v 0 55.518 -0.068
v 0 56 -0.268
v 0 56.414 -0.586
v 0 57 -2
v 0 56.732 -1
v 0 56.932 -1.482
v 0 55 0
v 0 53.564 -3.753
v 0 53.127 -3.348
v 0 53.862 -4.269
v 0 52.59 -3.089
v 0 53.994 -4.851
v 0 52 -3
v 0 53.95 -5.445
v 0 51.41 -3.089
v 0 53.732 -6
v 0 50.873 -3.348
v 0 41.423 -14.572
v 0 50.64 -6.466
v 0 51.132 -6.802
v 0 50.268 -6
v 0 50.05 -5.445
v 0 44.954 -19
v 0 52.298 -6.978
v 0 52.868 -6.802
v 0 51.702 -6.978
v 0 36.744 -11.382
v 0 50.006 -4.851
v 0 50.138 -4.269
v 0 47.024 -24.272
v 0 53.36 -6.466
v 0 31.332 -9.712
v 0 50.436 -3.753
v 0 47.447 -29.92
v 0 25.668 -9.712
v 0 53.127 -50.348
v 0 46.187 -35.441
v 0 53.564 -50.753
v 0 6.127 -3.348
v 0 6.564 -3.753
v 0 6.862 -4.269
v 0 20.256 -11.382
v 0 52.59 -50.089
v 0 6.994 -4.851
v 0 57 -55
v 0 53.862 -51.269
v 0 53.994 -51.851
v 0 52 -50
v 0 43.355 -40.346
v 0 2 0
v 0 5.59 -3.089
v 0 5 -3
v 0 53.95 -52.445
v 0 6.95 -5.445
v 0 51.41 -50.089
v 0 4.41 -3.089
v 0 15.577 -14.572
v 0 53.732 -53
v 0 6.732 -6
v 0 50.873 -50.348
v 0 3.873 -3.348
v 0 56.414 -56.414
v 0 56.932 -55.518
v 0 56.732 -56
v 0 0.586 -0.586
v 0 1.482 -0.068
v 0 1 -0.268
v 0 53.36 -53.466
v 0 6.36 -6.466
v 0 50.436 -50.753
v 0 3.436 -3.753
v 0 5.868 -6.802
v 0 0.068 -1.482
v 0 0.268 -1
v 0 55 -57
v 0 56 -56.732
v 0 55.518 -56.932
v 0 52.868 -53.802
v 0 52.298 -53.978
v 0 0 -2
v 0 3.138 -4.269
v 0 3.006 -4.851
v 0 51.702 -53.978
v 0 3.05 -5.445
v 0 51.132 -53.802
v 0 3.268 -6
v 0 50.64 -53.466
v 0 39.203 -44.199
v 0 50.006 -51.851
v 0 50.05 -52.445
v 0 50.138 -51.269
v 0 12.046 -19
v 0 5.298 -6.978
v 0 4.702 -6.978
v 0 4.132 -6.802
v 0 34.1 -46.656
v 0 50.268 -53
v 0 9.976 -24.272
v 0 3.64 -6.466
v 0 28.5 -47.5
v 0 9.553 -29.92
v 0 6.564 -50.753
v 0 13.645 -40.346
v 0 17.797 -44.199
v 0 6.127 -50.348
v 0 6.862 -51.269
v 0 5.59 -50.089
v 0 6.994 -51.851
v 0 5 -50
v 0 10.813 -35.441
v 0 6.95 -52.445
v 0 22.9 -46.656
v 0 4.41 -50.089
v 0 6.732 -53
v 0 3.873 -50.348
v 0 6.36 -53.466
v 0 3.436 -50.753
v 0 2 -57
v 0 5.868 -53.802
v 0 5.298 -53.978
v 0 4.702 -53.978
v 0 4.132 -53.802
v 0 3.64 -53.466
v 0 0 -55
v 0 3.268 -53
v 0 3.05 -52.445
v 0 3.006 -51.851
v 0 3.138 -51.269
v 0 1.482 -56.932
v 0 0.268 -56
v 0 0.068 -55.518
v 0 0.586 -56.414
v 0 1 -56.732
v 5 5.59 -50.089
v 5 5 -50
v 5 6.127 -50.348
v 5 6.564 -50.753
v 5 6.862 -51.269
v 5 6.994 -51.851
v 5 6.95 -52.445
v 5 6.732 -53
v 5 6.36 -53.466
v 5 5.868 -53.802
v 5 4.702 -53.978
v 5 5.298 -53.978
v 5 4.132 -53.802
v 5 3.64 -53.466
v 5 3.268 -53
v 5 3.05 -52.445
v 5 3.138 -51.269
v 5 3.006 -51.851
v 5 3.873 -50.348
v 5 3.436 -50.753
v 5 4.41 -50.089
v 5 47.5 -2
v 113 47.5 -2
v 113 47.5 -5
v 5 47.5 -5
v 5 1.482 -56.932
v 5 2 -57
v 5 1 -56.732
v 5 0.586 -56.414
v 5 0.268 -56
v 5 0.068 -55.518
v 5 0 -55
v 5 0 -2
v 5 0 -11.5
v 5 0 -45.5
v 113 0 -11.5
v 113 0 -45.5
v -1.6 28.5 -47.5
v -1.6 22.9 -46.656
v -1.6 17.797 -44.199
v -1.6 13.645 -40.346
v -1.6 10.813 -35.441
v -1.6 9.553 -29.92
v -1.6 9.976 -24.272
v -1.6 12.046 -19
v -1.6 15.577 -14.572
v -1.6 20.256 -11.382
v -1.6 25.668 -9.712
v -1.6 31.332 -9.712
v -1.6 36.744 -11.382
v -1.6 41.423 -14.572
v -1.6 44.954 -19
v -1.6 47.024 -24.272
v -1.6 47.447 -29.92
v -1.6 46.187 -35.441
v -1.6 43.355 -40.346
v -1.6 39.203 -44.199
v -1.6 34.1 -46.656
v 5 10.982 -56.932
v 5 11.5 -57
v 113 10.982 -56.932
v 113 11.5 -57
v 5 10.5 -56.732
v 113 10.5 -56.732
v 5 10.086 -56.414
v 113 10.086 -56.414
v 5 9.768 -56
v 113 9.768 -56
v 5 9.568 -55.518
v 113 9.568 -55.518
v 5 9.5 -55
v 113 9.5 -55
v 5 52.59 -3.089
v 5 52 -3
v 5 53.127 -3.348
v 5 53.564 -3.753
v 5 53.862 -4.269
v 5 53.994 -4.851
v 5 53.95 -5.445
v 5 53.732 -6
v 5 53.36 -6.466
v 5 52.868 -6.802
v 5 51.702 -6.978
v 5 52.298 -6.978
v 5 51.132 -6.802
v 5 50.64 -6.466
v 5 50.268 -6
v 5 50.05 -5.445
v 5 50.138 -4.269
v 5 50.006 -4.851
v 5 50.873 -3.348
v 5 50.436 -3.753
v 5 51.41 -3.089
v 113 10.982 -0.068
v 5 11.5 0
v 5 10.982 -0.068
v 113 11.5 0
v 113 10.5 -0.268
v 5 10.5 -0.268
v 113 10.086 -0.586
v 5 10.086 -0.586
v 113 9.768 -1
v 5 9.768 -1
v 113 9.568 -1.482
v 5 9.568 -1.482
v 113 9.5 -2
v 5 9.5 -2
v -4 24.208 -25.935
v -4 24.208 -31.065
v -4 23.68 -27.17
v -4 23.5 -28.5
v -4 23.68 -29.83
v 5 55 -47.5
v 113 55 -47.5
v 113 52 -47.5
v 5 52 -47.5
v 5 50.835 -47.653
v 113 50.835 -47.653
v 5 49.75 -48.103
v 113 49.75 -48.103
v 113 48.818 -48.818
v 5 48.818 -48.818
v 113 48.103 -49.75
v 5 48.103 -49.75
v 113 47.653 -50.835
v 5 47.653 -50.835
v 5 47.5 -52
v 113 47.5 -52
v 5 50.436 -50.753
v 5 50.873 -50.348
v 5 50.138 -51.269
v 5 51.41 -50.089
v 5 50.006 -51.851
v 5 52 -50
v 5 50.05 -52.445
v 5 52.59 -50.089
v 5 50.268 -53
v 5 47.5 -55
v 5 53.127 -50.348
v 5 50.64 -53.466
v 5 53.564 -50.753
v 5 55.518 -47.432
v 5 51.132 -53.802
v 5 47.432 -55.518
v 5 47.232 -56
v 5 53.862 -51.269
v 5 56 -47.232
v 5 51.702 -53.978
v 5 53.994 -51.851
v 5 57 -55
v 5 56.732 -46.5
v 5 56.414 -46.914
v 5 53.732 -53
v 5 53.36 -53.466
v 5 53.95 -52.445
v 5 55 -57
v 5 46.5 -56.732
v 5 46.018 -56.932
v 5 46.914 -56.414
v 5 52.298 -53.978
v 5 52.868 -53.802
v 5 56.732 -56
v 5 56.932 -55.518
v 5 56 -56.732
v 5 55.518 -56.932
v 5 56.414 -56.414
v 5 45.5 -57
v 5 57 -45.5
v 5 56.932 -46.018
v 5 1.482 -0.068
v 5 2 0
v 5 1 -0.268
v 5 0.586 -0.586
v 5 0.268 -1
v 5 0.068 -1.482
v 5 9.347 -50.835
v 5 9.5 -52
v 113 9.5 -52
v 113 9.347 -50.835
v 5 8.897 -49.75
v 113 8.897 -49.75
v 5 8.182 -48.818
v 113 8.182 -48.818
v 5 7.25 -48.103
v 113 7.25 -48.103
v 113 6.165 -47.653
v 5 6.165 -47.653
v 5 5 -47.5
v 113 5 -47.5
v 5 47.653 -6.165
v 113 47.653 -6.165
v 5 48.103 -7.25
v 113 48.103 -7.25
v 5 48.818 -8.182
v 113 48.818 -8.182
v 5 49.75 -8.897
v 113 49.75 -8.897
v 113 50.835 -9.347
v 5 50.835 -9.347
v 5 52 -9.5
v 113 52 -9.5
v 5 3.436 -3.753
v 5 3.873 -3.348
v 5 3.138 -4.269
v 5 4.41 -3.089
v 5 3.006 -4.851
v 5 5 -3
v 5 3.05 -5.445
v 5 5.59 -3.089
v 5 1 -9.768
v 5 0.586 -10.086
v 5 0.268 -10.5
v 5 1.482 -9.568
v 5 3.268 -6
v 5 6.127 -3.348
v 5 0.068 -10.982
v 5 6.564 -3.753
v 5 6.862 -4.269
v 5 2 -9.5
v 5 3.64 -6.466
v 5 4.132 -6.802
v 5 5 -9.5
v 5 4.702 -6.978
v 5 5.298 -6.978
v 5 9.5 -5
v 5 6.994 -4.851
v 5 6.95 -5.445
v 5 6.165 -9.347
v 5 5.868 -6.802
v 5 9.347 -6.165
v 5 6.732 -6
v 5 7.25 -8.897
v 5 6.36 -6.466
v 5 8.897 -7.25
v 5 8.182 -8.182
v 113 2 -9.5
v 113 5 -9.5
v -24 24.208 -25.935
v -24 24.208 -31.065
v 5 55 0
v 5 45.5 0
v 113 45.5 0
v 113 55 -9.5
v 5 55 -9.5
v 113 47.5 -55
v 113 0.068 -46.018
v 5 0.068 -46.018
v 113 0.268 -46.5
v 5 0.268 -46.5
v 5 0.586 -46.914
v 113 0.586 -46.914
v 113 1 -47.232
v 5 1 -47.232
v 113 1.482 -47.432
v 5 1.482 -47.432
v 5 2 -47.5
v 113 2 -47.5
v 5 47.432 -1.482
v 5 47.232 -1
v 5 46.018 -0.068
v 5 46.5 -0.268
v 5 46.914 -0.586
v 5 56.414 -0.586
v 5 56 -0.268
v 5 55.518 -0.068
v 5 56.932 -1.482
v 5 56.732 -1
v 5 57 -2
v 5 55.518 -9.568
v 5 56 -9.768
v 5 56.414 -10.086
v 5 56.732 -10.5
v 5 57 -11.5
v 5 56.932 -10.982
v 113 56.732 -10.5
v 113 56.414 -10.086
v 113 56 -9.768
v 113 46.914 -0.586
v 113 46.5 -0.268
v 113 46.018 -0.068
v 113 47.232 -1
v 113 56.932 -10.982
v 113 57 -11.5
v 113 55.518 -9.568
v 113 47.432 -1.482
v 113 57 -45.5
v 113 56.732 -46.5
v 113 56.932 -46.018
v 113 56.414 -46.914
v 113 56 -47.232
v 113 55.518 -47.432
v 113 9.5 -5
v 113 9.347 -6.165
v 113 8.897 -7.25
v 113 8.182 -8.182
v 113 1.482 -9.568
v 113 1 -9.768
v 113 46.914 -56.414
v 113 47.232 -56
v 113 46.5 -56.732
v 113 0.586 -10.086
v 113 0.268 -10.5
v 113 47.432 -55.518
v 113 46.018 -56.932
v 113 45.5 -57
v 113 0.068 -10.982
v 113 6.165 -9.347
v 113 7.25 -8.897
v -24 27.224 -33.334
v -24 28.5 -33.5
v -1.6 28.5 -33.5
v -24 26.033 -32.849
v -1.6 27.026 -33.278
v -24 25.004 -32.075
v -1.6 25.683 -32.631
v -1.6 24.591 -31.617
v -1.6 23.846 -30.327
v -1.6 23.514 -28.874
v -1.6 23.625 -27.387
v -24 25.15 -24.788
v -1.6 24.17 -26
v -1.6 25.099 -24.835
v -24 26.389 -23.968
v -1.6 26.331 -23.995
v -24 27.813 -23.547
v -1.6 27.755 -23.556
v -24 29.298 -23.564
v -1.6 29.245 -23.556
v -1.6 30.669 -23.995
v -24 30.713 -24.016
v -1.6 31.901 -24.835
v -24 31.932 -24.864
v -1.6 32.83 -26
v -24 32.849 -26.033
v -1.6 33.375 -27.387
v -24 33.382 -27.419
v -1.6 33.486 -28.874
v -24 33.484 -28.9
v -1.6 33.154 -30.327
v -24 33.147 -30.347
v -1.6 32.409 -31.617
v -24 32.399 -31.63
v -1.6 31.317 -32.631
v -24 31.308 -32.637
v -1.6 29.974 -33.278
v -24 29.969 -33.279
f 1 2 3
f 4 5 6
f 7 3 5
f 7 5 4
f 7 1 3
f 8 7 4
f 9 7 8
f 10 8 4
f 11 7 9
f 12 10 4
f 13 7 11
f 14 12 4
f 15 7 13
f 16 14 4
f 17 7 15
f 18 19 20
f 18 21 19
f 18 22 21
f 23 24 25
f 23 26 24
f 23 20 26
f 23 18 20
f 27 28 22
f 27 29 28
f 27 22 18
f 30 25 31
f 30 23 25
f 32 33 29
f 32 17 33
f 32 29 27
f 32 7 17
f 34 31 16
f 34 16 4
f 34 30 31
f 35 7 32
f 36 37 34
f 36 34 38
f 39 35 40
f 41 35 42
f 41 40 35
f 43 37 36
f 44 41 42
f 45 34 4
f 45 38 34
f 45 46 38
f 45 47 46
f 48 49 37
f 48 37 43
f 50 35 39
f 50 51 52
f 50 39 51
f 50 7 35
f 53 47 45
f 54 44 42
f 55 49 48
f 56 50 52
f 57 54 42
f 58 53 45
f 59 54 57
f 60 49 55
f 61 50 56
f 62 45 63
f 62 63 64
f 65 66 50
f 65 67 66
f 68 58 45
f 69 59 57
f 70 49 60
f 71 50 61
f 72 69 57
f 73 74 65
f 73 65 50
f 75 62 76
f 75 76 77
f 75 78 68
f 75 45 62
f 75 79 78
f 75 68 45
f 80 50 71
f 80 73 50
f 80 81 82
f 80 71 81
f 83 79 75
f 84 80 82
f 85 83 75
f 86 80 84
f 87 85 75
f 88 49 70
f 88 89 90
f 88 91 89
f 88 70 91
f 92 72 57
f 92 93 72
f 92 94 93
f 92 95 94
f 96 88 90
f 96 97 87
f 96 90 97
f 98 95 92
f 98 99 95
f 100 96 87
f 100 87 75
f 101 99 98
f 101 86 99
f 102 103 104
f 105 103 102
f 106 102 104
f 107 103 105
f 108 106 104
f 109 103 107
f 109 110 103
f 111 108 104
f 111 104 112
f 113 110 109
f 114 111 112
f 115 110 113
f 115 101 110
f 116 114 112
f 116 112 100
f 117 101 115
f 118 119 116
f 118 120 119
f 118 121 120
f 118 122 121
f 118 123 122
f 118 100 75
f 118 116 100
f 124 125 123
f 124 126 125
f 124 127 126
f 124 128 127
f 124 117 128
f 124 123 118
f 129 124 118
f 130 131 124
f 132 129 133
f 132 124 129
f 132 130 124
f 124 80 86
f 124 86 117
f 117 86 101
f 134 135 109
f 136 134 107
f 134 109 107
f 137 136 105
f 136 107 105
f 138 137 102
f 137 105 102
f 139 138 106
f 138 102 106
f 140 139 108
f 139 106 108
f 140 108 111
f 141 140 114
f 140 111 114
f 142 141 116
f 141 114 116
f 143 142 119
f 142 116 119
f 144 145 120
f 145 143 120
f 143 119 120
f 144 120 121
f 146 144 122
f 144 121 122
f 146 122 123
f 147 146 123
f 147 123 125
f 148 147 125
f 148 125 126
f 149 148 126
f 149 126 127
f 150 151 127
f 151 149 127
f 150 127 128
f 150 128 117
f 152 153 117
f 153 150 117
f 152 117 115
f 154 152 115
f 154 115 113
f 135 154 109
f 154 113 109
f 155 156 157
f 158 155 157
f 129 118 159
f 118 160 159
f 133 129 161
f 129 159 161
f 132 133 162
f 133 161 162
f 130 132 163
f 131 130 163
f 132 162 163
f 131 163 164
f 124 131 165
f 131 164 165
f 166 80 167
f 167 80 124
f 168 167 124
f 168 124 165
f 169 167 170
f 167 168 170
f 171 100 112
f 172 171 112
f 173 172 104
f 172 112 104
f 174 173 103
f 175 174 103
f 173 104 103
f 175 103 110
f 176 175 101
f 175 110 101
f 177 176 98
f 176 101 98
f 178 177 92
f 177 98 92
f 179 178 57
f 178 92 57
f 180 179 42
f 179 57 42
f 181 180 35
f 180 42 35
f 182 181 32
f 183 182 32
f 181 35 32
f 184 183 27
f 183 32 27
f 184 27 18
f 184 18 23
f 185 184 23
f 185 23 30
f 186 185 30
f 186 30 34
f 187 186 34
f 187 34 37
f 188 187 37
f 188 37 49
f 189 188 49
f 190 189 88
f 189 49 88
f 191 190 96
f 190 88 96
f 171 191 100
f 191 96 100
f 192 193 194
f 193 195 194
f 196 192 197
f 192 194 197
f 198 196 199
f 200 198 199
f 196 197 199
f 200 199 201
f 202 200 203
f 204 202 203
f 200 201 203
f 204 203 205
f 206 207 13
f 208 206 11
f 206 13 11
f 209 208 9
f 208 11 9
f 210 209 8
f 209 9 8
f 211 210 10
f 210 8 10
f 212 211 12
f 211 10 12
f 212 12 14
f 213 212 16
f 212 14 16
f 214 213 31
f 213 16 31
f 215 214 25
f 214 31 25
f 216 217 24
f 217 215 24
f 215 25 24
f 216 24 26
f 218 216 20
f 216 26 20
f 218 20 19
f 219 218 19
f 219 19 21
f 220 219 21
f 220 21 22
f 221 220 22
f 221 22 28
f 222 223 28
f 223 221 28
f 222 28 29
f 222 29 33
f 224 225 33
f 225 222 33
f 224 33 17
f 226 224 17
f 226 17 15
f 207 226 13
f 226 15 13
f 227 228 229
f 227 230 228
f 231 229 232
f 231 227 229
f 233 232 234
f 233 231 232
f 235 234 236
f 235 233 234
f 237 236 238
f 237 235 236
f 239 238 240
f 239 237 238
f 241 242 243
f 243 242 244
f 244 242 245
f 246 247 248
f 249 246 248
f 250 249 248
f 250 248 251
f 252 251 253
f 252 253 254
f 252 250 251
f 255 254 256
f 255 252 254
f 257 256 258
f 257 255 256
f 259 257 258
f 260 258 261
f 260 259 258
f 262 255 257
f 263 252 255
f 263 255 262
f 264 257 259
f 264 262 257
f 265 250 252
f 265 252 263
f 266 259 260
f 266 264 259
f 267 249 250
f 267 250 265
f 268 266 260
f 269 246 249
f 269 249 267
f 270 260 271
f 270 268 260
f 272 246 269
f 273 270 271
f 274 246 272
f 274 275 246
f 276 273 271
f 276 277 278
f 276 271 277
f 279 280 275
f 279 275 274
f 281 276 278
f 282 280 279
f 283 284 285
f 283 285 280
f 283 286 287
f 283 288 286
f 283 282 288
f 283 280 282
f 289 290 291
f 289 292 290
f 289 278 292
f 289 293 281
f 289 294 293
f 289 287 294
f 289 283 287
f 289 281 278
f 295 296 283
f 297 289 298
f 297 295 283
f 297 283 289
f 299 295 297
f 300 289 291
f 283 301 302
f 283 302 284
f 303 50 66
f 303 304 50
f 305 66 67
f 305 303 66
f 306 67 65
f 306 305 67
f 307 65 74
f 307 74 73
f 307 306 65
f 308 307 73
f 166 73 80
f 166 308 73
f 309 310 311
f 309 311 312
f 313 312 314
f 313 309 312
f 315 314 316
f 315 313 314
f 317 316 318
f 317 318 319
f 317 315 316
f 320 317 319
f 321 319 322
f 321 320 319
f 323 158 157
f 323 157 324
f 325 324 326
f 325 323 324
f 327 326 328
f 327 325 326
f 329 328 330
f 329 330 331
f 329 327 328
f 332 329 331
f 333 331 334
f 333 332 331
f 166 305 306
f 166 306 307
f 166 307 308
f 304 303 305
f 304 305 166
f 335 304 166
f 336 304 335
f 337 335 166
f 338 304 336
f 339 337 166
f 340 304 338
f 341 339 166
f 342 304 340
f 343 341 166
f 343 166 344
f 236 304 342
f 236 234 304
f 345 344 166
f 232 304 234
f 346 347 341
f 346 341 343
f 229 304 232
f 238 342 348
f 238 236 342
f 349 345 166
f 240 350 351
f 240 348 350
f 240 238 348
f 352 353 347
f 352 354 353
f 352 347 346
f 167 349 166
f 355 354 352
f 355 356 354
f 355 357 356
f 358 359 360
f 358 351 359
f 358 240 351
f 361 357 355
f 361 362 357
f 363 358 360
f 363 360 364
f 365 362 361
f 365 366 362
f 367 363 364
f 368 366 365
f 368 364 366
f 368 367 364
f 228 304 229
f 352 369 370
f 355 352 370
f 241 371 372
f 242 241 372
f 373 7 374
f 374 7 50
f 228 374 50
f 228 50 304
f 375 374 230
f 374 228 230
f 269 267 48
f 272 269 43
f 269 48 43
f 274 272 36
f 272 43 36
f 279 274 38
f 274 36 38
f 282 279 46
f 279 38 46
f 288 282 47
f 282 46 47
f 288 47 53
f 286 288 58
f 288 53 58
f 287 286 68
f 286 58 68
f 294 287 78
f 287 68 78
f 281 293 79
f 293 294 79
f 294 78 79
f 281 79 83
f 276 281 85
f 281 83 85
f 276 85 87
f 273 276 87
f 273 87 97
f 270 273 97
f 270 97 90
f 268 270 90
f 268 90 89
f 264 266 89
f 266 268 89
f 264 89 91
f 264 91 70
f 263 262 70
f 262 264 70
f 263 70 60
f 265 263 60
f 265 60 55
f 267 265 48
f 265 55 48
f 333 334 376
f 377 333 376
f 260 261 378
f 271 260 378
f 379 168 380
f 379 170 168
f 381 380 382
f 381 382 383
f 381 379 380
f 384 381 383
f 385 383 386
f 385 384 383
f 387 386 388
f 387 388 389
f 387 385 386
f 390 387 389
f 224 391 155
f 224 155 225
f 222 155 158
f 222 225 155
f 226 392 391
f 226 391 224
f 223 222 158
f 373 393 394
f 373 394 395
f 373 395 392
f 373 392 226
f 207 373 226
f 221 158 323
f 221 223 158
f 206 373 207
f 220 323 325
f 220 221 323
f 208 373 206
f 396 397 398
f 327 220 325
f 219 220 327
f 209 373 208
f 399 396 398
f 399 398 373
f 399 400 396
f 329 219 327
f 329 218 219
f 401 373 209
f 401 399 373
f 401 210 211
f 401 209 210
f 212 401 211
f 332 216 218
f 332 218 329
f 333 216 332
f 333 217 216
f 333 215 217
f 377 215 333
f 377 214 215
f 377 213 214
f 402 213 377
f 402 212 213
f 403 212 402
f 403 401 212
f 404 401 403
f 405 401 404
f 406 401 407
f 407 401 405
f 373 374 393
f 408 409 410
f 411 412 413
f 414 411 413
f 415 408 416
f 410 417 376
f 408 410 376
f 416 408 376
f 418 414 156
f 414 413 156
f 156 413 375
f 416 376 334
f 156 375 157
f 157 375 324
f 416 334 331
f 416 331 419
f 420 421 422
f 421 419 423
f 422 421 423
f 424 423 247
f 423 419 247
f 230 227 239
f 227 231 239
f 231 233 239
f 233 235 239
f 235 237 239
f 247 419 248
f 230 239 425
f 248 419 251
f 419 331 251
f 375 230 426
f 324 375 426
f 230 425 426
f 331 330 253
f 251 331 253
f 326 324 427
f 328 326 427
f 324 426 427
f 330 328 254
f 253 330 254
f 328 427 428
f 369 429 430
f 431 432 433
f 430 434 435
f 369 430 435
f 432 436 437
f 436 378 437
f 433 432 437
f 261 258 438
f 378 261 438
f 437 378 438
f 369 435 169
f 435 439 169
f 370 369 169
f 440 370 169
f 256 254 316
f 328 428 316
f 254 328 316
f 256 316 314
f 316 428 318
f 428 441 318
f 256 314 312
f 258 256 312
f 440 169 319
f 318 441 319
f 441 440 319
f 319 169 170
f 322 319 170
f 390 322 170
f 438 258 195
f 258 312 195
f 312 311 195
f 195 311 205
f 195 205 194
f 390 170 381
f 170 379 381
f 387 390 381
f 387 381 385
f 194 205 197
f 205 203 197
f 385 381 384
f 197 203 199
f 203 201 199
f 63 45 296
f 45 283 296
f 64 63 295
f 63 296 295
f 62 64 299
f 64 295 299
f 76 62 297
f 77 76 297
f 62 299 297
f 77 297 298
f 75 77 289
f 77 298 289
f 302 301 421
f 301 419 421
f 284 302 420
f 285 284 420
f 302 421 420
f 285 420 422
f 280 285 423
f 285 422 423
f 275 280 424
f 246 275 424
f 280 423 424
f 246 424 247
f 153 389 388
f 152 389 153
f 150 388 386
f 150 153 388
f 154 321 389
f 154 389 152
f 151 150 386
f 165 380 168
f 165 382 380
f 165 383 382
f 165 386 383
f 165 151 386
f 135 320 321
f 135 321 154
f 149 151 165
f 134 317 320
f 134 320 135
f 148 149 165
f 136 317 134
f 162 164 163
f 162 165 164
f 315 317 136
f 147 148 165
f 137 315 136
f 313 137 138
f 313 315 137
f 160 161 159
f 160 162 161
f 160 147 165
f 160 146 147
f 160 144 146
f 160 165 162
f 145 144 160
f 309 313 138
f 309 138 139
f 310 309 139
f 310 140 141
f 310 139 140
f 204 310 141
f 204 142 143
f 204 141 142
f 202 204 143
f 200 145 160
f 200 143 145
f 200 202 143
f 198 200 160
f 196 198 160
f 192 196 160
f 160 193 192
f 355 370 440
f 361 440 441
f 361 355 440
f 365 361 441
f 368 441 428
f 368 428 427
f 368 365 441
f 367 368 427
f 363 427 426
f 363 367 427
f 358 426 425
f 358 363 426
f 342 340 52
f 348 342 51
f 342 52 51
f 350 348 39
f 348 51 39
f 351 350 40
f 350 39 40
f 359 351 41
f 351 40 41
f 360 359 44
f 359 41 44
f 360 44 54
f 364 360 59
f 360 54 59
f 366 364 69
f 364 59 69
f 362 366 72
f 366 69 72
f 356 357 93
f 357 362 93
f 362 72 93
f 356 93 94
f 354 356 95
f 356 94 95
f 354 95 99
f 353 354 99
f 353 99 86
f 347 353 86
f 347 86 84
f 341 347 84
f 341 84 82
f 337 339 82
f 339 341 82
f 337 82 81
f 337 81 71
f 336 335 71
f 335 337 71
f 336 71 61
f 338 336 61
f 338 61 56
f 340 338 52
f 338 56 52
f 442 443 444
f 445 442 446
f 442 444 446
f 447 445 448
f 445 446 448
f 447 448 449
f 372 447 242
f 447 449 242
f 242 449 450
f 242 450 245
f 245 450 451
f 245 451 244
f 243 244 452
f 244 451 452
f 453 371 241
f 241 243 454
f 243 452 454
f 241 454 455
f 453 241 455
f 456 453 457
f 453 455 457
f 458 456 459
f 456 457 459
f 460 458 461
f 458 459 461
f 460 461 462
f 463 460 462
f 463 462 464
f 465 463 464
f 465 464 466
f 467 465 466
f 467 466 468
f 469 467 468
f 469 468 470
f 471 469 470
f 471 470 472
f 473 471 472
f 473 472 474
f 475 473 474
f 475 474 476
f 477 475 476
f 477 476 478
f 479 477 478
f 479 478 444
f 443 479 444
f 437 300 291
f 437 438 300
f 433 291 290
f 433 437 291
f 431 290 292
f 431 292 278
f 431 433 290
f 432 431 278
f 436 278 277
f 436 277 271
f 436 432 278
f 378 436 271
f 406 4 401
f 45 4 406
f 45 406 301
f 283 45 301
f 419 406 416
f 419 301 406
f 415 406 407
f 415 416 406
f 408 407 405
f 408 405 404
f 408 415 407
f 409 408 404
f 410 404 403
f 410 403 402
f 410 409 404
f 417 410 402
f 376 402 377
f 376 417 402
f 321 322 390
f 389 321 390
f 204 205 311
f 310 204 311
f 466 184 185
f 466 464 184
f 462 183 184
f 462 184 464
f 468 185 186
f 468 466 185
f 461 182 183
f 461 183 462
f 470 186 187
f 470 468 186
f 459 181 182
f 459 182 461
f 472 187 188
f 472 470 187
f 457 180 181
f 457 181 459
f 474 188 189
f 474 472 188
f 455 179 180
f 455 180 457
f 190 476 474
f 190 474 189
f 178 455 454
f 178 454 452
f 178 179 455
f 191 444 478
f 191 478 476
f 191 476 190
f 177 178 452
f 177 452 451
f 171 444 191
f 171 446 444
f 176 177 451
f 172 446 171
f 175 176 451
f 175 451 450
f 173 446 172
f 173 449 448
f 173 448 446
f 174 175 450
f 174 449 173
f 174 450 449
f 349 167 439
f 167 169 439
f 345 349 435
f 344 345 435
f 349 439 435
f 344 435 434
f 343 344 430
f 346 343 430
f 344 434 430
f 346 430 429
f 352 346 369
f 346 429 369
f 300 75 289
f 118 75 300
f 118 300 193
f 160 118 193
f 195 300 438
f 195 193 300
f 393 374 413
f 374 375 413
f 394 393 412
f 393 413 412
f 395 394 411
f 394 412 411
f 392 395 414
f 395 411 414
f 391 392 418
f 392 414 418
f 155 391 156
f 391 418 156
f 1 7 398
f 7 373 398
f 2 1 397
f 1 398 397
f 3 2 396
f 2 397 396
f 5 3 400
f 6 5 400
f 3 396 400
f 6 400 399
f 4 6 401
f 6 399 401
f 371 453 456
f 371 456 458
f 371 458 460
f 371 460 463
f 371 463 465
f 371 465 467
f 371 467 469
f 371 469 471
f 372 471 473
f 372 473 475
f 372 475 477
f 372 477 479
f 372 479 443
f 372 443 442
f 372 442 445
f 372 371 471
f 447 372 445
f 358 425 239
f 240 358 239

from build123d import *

# Parameters (mm, degrees)
SKETCH2_W            = 113
SKETCH2_H            = 57
BOSS_EXTRUDE1_DEPTH  = 57
SKETCH11_R           = 5
BOSS_EXTRUDE12_DEPTH = 24
SKETCH11_6_R         = 19
SKETCH11_6_R_2       = 5
BOSS_EXTRUDE13_DEPTH = 1.6
SKETCH13_R           = 2
CUT_EXTRUDE1_DEPTH   = 113
CUT_EXTRUDE4_START   = -20
CUT_EXTRUDE4_DEPTH   = 20
CUT_EXTRUDE5_START   = -108
SKETCH22_R           = 2
CUT_EXTRUDE5_DEPTH   = 108
FILLET1_R            = 2
FILLET2_R            = 2


with BuildPart() as part:
    # Sketch2 → Boss-Extrude1 (new body)
    with BuildSketch(Plane(origin=(0, 0, 0), x_dir=(1, 0, 0), z_dir=(0, 1, 0))):
        with Locations((56.5, 28.5)):
            Rectangle(SKETCH2_W, SKETCH2_H)
    extrude(amount=BOSS_EXTRUDE1_DEPTH)

    # Sketch11 → Boss-Extrude12 (add)
    with BuildSketch(Plane.ZY):
        with Locations((-28.5, 28.5)):
            Circle(SKETCH11_R)
    extrude(amount=BOSS_EXTRUDE12_DEPTH)

    # Sketch11<6> → Boss-Extrude13 (add)
    with BuildSketch(Plane.ZY):
        with Locations((-28.5, 28.5)):
            Circle(SKETCH11_6_R)
        with Locations((-28.5, 28.5)):
            Circle(SKETCH11_6_R_2, mode=Mode.SUBTRACT)
    extrude(amount=BOSS_EXTRUDE13_DEPTH)

    # Sketch13 → Cut-Extrude1 (cut)
    with BuildSketch(Plane.ZY):
        with Locations((-5, 5)):
            Circle(SKETCH13_R)
        with Locations((-52, 5)):
            Circle(SKETCH13_R)
        with Locations((-52, 52)):
            Circle(SKETCH13_R)
        with Locations((-5, 52)):
            Circle(SKETCH13_R)
    extrude(amount=-CUT_EXTRUDE1_DEPTH, mode=Mode.SUBTRACT)

    # Sketch14 → Cut-Extrude4 (cut)
    with BuildSketch(Plane.ZY.offset(24).offset(CUT_EXTRUDE4_START)):
        with BuildLine():
            Line((-28.5, 24.207845288), (-31.06464577, 24.207845288))
            ThreePointArc((-31.06464577, 24.207845288), (-28.5, 23.5), (-25.93535423, 24.207845288))
            Line((-25.93535423, 24.207845288), (-28.5, 24.207845288))
        make_face()
    extrude(amount=CUT_EXTRUDE4_DEPTH, mode=Mode.SUBTRACT)

    # Sketch22 → Cut-Extrude5 (cut)
    # profile 1 of 4: a face of its own
    with BuildSketch(Plane(origin=(113, 0, 0), x_dir=(0, 0, -1), z_dir=(1, 0, 0)).offset(CUT_EXTRUDE5_START)):
        with BuildLine():
            ThreePointArc((47.5, 52), (48.818019485, 48.818019485), (52, 47.5))
            Line((52, 47.5), (57, 47.5))
            Line((57, 47.5), (57, 57))
            Line((57, 57), (47.5, 57))
            Line((47.5, 57), (47.5, 52))
        make_face()
        with Locations((52, 52)):
            Circle(SKETCH22_R, mode=Mode.SUBTRACT)
    # profile 2 of 4: a face of its own
    with BuildSketch(Plane(origin=(113, 0, 0), x_dir=(0, 0, -1), z_dir=(1, 0, 0)).offset(CUT_EXTRUDE5_START)):
        with BuildLine():
            Line((57, 0), (57, 9.5))
            Line((57, 9.5), (52, 9.5))
            ThreePointArc((52, 9.5), (48.818019485, 8.181980515), (47.5, 5))
            Line((47.5, 5), (47.5, 0))
            Line((47.5, 0), (57, 0))
        make_face()
        with Locations((52, 5)):
            Circle(SKETCH22_R, mode=Mode.SUBTRACT)
    # profile 3 of 4: a face of its own
    with BuildSketch(Plane(origin=(113, 0, 0), x_dir=(0, 0, -1), z_dir=(1, 0, 0)).offset(CUT_EXTRUDE5_START)):
        with BuildLine():
            Line((9.5, 52), (9.5, 57))
            Line((9.5, 57), (0, 57))
            Line((0, 57), (0, 47.5))
            Line((0, 47.5), (5, 47.5))
            ThreePointArc((5, 47.5), (8.181980515, 48.818019485), (9.5, 52))
        make_face()
        with Locations((5, 52)):
            Circle(SKETCH22_R, mode=Mode.SUBTRACT)
    # profile 4 of 4: a face of its own
    with BuildSketch(Plane(origin=(113, 0, 0), x_dir=(0, 0, -1), z_dir=(1, 0, 0)).offset(CUT_EXTRUDE5_START)):
        with BuildLine():
            Line((0, 0), (9.5, 0))
            Line((9.5, 0), (9.5, 5))
            ThreePointArc((9.5, 5), (8.181980515, 8.181980515), (5, 9.5))
            Line((5, 9.5), (0, 9.5))
            Line((0, 9.5), (0, 0))
        make_face()
        with Locations((5, 5)):
            Circle(SKETCH22_R, mode=Mode.SUBTRACT)
    extrude(amount=CUT_EXTRUDE5_DEPTH, mode=Mode.SUBTRACT)

    # Fillet1
    fillet1_edges = [part.edges().sort_by_distance(p)[0] for p in [
        (59, 57, -9.5),
        (59, 57, -47.5),
        (59, 47.5, -57),
        (59, 9.5, -57),
        (59, 0, -47.5),
        (59, 0, -9.5),
        (59, 9.5, 0),
        (59, 47.5, 0),
    ]]
    fillet(fillet1_edges, radius=FILLET1_R)

    # Fillet2
    fillet2_edges = [part.edges().sort_by_distance(p)[0] for p in [
        (2.5, 0, 0),
        (2.5, 0, -57),
        (2.5, 57, -57),
        (2.5, 57, 0),
    ]]
    fillet(fillet2_edges, radius=FILLET2_R)


solid = part.part
